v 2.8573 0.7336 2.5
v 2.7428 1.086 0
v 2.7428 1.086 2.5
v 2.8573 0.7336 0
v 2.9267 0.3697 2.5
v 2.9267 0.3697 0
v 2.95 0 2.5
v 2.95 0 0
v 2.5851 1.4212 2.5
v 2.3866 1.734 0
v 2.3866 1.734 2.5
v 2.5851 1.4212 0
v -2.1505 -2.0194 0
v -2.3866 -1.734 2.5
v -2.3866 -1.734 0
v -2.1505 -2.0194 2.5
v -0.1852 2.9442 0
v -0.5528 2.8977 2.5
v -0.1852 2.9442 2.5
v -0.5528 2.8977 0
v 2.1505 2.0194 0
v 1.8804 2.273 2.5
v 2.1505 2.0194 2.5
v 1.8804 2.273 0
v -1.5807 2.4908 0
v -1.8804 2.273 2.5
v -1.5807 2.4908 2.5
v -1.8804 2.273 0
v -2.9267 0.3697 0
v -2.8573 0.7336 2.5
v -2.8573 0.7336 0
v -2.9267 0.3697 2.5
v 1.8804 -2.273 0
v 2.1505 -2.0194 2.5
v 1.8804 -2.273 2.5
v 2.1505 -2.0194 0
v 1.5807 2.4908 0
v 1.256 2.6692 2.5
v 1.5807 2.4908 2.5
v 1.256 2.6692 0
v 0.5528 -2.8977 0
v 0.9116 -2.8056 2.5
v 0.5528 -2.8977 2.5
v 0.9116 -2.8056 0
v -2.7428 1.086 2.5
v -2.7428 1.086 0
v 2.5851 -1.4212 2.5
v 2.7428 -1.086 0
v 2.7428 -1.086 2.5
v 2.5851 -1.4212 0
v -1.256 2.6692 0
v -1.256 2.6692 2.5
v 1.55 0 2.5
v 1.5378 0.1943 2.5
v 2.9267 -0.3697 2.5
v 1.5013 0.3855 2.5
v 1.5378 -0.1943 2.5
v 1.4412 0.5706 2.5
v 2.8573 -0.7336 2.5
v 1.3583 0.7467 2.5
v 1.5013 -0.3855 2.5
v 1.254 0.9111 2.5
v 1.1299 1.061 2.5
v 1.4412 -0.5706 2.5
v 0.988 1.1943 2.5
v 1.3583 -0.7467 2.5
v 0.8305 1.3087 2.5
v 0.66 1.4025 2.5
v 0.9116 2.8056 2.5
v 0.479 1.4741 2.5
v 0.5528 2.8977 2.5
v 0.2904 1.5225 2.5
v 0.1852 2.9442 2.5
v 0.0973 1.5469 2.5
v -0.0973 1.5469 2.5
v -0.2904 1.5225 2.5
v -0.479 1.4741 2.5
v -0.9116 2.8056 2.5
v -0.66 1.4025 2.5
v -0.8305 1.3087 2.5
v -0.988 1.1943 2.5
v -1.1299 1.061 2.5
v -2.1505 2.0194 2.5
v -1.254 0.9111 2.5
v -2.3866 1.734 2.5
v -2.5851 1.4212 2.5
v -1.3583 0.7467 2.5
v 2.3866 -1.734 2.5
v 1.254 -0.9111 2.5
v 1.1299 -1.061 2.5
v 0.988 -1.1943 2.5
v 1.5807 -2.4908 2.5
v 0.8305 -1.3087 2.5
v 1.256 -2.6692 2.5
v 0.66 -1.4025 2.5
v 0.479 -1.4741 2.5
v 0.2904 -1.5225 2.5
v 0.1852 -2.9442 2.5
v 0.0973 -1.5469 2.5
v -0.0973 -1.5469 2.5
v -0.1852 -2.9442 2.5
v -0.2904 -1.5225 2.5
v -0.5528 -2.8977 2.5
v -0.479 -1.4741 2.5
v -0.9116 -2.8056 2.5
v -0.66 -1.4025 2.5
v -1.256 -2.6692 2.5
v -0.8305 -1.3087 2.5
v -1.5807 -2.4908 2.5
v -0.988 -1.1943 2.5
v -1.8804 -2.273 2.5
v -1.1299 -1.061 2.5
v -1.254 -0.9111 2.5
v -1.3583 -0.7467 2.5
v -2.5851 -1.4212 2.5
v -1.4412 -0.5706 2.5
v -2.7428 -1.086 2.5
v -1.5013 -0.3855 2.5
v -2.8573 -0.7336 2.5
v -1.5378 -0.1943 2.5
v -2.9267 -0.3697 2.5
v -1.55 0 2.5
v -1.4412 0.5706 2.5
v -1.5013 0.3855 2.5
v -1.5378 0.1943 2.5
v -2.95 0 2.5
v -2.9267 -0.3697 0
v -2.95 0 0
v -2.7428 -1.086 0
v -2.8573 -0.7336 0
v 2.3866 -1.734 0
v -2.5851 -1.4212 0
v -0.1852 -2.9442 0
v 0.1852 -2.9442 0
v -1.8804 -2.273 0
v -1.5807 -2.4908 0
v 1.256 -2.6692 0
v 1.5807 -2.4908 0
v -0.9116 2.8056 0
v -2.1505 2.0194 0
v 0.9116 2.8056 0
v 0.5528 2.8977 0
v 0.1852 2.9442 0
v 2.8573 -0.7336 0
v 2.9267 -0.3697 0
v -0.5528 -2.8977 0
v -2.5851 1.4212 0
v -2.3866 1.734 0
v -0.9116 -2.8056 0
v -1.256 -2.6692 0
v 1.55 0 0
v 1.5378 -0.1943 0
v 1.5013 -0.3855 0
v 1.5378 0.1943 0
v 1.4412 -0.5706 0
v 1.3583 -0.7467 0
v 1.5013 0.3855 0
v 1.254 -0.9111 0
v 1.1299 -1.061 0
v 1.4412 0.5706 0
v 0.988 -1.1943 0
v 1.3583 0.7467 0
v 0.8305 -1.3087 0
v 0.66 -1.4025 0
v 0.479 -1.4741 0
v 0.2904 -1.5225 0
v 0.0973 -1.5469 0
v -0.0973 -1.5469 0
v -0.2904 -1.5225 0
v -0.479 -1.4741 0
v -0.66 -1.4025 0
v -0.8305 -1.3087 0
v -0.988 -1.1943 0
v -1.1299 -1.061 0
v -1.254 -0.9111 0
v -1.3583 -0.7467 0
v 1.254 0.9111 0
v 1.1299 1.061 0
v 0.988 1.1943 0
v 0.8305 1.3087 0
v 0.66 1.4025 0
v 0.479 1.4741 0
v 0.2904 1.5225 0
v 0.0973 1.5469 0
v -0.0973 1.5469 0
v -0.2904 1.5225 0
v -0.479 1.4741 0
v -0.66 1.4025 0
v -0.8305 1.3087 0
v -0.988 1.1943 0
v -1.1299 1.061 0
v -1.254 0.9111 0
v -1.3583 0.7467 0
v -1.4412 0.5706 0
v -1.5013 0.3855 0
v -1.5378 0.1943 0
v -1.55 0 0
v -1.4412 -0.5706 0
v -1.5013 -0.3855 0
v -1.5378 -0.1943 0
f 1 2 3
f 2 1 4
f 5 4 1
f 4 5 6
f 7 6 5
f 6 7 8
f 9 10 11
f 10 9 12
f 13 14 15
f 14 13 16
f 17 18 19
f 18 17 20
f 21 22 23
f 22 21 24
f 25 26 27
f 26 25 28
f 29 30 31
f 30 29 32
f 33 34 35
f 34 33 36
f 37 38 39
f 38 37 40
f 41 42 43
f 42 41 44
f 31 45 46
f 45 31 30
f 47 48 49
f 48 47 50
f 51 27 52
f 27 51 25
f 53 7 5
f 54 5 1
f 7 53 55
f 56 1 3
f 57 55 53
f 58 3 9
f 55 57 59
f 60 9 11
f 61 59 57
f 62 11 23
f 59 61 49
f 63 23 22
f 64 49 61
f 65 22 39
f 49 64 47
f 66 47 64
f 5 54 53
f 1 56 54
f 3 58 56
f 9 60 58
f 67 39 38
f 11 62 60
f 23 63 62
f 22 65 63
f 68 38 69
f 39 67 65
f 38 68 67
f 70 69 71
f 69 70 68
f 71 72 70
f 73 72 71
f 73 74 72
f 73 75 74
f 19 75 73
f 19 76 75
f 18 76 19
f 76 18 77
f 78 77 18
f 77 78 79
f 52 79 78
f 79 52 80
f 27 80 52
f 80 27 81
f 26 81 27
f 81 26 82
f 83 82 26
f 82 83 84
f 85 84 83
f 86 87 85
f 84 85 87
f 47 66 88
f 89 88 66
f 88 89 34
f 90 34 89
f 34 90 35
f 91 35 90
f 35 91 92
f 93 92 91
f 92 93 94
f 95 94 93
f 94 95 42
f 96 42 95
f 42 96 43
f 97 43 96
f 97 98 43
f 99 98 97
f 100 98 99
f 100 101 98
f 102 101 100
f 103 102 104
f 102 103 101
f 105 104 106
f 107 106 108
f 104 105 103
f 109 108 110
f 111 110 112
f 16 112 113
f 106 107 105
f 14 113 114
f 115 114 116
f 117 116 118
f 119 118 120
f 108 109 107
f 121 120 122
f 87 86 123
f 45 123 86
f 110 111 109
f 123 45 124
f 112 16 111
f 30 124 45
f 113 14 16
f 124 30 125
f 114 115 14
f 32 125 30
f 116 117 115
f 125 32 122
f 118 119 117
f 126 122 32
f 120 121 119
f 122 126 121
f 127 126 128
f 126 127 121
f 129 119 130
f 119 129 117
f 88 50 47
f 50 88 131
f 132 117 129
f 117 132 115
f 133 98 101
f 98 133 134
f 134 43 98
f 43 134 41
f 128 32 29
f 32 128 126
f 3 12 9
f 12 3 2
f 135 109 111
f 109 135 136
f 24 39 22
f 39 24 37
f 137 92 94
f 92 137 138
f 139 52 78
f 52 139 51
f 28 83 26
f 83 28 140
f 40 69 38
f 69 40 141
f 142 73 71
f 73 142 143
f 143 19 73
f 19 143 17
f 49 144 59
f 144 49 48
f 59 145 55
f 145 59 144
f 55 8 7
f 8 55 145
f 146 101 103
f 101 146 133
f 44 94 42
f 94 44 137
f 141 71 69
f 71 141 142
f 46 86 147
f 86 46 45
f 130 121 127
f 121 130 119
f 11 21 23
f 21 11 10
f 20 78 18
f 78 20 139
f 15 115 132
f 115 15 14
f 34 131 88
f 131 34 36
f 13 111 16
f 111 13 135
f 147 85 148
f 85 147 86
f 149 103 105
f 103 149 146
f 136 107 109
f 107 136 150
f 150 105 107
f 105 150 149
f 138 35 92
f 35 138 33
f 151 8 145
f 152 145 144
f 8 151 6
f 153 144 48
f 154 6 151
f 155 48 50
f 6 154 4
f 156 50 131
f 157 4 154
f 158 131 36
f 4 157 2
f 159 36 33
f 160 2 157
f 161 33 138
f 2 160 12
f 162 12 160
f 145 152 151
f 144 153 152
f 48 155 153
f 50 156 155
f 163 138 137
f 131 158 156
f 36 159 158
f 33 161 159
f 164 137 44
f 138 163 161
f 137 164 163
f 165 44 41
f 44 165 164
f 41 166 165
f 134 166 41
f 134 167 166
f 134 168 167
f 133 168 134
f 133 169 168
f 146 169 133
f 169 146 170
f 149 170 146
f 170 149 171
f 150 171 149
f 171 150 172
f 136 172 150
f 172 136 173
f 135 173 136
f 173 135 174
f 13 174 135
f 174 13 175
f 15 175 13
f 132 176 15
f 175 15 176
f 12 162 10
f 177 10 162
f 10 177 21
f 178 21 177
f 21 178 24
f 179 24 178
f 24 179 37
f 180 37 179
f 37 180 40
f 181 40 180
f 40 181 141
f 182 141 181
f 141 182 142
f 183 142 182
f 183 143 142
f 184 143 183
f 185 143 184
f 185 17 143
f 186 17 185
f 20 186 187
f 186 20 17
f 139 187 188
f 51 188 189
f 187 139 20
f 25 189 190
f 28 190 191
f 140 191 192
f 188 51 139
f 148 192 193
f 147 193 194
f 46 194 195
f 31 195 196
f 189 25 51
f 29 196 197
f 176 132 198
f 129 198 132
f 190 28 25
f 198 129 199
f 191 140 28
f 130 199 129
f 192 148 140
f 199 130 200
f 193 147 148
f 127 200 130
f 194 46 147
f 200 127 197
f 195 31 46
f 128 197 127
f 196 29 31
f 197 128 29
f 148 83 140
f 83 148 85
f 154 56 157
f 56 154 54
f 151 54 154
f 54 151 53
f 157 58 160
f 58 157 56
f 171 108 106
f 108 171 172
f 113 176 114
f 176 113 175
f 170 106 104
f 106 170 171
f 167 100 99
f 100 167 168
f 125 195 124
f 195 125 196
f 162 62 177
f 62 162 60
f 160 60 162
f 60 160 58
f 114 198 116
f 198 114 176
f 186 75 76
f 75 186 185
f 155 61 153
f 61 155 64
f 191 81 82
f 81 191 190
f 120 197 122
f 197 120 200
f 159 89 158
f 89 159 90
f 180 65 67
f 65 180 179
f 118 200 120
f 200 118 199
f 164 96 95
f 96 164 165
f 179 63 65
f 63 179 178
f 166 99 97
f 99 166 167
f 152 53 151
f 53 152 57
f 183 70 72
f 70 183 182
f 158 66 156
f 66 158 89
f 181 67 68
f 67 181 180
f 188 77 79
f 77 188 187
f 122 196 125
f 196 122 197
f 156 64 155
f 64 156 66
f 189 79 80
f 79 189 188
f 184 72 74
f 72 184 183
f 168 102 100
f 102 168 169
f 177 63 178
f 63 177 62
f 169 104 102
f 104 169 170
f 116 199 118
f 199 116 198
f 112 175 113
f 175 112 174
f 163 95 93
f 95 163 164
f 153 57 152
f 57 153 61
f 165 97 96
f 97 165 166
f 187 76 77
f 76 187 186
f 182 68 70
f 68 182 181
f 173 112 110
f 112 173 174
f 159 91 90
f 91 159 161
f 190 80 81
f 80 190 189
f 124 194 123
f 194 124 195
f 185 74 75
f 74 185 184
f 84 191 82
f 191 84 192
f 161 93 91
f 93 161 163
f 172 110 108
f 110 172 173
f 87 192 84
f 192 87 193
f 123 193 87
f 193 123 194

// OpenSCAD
$fn = 50;

difference() {
    cylinder(r = 2.95, h = 2.5);
    cylinder(r = 1.55, h = 2.5);
}
